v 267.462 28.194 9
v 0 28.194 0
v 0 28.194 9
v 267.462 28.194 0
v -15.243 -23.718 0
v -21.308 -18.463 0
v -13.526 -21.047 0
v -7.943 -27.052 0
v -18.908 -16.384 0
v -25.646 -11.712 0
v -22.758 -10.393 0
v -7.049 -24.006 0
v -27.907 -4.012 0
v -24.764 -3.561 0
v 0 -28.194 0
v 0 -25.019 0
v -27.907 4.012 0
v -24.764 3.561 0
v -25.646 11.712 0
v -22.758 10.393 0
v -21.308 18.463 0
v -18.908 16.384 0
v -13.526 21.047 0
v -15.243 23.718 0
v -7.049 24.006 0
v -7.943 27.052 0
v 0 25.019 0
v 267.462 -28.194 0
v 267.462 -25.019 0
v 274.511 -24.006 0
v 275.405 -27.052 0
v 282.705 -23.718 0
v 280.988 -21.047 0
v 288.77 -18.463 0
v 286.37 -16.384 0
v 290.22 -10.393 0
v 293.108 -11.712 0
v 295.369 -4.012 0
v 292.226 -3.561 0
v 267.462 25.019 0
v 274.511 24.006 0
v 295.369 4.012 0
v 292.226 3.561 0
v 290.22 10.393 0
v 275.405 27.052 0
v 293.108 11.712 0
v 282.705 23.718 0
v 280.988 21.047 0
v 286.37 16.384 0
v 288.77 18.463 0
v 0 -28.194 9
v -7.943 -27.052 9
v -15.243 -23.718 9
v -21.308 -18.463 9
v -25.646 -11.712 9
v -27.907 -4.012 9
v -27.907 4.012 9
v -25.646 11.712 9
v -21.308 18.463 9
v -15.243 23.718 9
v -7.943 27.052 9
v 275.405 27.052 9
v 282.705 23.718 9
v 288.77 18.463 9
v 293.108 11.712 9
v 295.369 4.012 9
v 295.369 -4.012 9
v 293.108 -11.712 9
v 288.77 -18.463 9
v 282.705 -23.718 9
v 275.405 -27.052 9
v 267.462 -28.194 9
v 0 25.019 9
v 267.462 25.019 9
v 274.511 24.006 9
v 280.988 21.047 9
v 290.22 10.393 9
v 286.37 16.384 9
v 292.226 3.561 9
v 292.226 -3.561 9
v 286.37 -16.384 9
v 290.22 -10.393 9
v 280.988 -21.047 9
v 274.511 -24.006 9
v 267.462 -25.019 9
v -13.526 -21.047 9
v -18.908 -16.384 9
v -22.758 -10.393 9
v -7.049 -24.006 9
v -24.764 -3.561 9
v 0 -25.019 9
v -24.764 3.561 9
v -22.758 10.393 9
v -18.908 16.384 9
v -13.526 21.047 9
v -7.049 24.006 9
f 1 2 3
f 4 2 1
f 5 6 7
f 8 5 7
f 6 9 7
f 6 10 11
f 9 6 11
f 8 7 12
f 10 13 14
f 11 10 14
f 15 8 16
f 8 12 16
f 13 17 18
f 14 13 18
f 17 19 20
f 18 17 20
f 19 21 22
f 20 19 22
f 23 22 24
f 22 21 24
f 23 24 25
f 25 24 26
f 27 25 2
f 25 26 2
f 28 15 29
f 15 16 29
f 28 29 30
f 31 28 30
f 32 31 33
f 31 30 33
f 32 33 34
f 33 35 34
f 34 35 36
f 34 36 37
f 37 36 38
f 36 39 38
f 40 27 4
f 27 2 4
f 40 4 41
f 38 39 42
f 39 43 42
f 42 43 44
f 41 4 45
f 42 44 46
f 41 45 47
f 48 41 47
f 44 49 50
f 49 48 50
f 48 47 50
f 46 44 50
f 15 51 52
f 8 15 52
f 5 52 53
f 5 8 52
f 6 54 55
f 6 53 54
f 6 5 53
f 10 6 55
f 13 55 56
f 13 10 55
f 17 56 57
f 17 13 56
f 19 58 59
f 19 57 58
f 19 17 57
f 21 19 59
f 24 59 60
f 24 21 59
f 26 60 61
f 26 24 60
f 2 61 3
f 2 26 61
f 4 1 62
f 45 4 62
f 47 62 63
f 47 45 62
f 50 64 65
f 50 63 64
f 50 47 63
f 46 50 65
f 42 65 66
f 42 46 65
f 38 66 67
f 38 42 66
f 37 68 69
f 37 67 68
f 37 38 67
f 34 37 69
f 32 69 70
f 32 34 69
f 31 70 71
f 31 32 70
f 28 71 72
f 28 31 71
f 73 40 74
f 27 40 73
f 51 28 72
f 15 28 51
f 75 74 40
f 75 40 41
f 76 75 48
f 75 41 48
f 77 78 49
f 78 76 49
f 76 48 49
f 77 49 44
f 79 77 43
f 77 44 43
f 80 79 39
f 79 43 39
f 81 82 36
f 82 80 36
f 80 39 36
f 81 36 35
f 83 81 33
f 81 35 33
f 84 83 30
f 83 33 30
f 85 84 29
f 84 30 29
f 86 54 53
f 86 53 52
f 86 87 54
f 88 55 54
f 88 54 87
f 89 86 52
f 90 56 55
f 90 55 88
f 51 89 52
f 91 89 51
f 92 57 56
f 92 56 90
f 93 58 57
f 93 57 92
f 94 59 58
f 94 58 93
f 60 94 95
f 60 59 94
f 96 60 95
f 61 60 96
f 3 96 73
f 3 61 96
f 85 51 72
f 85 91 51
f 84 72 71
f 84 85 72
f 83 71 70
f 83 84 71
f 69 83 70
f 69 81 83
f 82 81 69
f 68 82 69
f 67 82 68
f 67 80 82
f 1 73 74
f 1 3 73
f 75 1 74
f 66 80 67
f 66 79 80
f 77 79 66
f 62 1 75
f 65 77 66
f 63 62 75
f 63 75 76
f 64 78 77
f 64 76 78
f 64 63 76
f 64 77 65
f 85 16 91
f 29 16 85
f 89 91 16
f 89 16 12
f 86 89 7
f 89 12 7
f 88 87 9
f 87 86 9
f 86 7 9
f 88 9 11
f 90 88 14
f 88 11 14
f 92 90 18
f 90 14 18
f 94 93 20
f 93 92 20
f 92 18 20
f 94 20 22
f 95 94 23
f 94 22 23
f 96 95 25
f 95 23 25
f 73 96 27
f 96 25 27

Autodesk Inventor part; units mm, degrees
ref_plane "YZ Plane" through (0, 0, 0) normal (1, 0, 0) x (0, 1, 0)
ref_plane "XZ Plane" through (0, 0, 0) normal (0, 1, 0) x (-1, 0, 0)
ref_plane "XY Plane" through (0, 0, 0) normal (0, 0, 1) x (1, 0, 0)
sketch "Sketch1" plane through (0, 0, 0) normal (0, 0, 1) x (1, 0, 0)
  circle A0 centre (0, 0) radius 24.892
  circle A1 centre (267.462, 0) radius 24.892
  line L0 (0, 0) -> (267.462, 0) construction
  line L1 (0, -25.019) -> (267.462, -25.019)
  line L2 (267.462, 25.019) -> (0, 25.019)
  arc A2 (0, 25.019) -> (0, -25.019) centre (0, 0) ccw
  arc A3 (267.462, -25.019) -> (267.462, 25.019) centre (267.462, 0) ccw
  line L3 (0, 28.194) -> (267.462, 28.194)
  arc A4 (267.462, -28.194) -> (267.462, 28.194) centre (267.462, 0) ccw
  line L4 (267.462, -28.194) -> (0, -28.194)
  arc A5 (0, 28.194) -> (0, -28.194) centre (0, 0) ccw
  line L5 (7.3323, 0) -> (3.6662, -6.35)
  line L6 (3.6662, -6.35) -> (-3.6662, -6.35)
  line L7 (-3.6662, -6.35) -> (-7.3323, 0)
  line L8 (-7.3323, 0) -> (-3.6662, 6.35)
  line L9 (-3.6662, 6.35) -> (3.6662, 6.35)
  line L10 (3.6662, 6.35) -> (7.3323, 0)
  line L11 (274.7943, 0) -> (271.1282, -6.35)
  line L12 (271.1282, -6.35) -> (263.7958, -6.35)
  line L13 (263.7958, -6.35) -> (260.1297, 0)
  line L14 (260.1297, 0) -> (263.7958, 6.35)
  line L15 (263.7958, 6.35) -> (271.1282, 6.35)
  line L16 (271.1282, 6.35) -> (274.7943, 0)
  point P0 (133.731, 0)
  dimension "d0" = 49.784
  dimension "d1" = 267.462
  dimension "d2" = 3.175
  dimension "d3" = 0.127
  dimension "d8" = 12.7
extrude "Extrusion2" add sketch "Sketch1" along normal blind 9 contours L3 A4 L4 A5
properties part number "DGB_005_Short Belt_Gates_695-5M-09"
